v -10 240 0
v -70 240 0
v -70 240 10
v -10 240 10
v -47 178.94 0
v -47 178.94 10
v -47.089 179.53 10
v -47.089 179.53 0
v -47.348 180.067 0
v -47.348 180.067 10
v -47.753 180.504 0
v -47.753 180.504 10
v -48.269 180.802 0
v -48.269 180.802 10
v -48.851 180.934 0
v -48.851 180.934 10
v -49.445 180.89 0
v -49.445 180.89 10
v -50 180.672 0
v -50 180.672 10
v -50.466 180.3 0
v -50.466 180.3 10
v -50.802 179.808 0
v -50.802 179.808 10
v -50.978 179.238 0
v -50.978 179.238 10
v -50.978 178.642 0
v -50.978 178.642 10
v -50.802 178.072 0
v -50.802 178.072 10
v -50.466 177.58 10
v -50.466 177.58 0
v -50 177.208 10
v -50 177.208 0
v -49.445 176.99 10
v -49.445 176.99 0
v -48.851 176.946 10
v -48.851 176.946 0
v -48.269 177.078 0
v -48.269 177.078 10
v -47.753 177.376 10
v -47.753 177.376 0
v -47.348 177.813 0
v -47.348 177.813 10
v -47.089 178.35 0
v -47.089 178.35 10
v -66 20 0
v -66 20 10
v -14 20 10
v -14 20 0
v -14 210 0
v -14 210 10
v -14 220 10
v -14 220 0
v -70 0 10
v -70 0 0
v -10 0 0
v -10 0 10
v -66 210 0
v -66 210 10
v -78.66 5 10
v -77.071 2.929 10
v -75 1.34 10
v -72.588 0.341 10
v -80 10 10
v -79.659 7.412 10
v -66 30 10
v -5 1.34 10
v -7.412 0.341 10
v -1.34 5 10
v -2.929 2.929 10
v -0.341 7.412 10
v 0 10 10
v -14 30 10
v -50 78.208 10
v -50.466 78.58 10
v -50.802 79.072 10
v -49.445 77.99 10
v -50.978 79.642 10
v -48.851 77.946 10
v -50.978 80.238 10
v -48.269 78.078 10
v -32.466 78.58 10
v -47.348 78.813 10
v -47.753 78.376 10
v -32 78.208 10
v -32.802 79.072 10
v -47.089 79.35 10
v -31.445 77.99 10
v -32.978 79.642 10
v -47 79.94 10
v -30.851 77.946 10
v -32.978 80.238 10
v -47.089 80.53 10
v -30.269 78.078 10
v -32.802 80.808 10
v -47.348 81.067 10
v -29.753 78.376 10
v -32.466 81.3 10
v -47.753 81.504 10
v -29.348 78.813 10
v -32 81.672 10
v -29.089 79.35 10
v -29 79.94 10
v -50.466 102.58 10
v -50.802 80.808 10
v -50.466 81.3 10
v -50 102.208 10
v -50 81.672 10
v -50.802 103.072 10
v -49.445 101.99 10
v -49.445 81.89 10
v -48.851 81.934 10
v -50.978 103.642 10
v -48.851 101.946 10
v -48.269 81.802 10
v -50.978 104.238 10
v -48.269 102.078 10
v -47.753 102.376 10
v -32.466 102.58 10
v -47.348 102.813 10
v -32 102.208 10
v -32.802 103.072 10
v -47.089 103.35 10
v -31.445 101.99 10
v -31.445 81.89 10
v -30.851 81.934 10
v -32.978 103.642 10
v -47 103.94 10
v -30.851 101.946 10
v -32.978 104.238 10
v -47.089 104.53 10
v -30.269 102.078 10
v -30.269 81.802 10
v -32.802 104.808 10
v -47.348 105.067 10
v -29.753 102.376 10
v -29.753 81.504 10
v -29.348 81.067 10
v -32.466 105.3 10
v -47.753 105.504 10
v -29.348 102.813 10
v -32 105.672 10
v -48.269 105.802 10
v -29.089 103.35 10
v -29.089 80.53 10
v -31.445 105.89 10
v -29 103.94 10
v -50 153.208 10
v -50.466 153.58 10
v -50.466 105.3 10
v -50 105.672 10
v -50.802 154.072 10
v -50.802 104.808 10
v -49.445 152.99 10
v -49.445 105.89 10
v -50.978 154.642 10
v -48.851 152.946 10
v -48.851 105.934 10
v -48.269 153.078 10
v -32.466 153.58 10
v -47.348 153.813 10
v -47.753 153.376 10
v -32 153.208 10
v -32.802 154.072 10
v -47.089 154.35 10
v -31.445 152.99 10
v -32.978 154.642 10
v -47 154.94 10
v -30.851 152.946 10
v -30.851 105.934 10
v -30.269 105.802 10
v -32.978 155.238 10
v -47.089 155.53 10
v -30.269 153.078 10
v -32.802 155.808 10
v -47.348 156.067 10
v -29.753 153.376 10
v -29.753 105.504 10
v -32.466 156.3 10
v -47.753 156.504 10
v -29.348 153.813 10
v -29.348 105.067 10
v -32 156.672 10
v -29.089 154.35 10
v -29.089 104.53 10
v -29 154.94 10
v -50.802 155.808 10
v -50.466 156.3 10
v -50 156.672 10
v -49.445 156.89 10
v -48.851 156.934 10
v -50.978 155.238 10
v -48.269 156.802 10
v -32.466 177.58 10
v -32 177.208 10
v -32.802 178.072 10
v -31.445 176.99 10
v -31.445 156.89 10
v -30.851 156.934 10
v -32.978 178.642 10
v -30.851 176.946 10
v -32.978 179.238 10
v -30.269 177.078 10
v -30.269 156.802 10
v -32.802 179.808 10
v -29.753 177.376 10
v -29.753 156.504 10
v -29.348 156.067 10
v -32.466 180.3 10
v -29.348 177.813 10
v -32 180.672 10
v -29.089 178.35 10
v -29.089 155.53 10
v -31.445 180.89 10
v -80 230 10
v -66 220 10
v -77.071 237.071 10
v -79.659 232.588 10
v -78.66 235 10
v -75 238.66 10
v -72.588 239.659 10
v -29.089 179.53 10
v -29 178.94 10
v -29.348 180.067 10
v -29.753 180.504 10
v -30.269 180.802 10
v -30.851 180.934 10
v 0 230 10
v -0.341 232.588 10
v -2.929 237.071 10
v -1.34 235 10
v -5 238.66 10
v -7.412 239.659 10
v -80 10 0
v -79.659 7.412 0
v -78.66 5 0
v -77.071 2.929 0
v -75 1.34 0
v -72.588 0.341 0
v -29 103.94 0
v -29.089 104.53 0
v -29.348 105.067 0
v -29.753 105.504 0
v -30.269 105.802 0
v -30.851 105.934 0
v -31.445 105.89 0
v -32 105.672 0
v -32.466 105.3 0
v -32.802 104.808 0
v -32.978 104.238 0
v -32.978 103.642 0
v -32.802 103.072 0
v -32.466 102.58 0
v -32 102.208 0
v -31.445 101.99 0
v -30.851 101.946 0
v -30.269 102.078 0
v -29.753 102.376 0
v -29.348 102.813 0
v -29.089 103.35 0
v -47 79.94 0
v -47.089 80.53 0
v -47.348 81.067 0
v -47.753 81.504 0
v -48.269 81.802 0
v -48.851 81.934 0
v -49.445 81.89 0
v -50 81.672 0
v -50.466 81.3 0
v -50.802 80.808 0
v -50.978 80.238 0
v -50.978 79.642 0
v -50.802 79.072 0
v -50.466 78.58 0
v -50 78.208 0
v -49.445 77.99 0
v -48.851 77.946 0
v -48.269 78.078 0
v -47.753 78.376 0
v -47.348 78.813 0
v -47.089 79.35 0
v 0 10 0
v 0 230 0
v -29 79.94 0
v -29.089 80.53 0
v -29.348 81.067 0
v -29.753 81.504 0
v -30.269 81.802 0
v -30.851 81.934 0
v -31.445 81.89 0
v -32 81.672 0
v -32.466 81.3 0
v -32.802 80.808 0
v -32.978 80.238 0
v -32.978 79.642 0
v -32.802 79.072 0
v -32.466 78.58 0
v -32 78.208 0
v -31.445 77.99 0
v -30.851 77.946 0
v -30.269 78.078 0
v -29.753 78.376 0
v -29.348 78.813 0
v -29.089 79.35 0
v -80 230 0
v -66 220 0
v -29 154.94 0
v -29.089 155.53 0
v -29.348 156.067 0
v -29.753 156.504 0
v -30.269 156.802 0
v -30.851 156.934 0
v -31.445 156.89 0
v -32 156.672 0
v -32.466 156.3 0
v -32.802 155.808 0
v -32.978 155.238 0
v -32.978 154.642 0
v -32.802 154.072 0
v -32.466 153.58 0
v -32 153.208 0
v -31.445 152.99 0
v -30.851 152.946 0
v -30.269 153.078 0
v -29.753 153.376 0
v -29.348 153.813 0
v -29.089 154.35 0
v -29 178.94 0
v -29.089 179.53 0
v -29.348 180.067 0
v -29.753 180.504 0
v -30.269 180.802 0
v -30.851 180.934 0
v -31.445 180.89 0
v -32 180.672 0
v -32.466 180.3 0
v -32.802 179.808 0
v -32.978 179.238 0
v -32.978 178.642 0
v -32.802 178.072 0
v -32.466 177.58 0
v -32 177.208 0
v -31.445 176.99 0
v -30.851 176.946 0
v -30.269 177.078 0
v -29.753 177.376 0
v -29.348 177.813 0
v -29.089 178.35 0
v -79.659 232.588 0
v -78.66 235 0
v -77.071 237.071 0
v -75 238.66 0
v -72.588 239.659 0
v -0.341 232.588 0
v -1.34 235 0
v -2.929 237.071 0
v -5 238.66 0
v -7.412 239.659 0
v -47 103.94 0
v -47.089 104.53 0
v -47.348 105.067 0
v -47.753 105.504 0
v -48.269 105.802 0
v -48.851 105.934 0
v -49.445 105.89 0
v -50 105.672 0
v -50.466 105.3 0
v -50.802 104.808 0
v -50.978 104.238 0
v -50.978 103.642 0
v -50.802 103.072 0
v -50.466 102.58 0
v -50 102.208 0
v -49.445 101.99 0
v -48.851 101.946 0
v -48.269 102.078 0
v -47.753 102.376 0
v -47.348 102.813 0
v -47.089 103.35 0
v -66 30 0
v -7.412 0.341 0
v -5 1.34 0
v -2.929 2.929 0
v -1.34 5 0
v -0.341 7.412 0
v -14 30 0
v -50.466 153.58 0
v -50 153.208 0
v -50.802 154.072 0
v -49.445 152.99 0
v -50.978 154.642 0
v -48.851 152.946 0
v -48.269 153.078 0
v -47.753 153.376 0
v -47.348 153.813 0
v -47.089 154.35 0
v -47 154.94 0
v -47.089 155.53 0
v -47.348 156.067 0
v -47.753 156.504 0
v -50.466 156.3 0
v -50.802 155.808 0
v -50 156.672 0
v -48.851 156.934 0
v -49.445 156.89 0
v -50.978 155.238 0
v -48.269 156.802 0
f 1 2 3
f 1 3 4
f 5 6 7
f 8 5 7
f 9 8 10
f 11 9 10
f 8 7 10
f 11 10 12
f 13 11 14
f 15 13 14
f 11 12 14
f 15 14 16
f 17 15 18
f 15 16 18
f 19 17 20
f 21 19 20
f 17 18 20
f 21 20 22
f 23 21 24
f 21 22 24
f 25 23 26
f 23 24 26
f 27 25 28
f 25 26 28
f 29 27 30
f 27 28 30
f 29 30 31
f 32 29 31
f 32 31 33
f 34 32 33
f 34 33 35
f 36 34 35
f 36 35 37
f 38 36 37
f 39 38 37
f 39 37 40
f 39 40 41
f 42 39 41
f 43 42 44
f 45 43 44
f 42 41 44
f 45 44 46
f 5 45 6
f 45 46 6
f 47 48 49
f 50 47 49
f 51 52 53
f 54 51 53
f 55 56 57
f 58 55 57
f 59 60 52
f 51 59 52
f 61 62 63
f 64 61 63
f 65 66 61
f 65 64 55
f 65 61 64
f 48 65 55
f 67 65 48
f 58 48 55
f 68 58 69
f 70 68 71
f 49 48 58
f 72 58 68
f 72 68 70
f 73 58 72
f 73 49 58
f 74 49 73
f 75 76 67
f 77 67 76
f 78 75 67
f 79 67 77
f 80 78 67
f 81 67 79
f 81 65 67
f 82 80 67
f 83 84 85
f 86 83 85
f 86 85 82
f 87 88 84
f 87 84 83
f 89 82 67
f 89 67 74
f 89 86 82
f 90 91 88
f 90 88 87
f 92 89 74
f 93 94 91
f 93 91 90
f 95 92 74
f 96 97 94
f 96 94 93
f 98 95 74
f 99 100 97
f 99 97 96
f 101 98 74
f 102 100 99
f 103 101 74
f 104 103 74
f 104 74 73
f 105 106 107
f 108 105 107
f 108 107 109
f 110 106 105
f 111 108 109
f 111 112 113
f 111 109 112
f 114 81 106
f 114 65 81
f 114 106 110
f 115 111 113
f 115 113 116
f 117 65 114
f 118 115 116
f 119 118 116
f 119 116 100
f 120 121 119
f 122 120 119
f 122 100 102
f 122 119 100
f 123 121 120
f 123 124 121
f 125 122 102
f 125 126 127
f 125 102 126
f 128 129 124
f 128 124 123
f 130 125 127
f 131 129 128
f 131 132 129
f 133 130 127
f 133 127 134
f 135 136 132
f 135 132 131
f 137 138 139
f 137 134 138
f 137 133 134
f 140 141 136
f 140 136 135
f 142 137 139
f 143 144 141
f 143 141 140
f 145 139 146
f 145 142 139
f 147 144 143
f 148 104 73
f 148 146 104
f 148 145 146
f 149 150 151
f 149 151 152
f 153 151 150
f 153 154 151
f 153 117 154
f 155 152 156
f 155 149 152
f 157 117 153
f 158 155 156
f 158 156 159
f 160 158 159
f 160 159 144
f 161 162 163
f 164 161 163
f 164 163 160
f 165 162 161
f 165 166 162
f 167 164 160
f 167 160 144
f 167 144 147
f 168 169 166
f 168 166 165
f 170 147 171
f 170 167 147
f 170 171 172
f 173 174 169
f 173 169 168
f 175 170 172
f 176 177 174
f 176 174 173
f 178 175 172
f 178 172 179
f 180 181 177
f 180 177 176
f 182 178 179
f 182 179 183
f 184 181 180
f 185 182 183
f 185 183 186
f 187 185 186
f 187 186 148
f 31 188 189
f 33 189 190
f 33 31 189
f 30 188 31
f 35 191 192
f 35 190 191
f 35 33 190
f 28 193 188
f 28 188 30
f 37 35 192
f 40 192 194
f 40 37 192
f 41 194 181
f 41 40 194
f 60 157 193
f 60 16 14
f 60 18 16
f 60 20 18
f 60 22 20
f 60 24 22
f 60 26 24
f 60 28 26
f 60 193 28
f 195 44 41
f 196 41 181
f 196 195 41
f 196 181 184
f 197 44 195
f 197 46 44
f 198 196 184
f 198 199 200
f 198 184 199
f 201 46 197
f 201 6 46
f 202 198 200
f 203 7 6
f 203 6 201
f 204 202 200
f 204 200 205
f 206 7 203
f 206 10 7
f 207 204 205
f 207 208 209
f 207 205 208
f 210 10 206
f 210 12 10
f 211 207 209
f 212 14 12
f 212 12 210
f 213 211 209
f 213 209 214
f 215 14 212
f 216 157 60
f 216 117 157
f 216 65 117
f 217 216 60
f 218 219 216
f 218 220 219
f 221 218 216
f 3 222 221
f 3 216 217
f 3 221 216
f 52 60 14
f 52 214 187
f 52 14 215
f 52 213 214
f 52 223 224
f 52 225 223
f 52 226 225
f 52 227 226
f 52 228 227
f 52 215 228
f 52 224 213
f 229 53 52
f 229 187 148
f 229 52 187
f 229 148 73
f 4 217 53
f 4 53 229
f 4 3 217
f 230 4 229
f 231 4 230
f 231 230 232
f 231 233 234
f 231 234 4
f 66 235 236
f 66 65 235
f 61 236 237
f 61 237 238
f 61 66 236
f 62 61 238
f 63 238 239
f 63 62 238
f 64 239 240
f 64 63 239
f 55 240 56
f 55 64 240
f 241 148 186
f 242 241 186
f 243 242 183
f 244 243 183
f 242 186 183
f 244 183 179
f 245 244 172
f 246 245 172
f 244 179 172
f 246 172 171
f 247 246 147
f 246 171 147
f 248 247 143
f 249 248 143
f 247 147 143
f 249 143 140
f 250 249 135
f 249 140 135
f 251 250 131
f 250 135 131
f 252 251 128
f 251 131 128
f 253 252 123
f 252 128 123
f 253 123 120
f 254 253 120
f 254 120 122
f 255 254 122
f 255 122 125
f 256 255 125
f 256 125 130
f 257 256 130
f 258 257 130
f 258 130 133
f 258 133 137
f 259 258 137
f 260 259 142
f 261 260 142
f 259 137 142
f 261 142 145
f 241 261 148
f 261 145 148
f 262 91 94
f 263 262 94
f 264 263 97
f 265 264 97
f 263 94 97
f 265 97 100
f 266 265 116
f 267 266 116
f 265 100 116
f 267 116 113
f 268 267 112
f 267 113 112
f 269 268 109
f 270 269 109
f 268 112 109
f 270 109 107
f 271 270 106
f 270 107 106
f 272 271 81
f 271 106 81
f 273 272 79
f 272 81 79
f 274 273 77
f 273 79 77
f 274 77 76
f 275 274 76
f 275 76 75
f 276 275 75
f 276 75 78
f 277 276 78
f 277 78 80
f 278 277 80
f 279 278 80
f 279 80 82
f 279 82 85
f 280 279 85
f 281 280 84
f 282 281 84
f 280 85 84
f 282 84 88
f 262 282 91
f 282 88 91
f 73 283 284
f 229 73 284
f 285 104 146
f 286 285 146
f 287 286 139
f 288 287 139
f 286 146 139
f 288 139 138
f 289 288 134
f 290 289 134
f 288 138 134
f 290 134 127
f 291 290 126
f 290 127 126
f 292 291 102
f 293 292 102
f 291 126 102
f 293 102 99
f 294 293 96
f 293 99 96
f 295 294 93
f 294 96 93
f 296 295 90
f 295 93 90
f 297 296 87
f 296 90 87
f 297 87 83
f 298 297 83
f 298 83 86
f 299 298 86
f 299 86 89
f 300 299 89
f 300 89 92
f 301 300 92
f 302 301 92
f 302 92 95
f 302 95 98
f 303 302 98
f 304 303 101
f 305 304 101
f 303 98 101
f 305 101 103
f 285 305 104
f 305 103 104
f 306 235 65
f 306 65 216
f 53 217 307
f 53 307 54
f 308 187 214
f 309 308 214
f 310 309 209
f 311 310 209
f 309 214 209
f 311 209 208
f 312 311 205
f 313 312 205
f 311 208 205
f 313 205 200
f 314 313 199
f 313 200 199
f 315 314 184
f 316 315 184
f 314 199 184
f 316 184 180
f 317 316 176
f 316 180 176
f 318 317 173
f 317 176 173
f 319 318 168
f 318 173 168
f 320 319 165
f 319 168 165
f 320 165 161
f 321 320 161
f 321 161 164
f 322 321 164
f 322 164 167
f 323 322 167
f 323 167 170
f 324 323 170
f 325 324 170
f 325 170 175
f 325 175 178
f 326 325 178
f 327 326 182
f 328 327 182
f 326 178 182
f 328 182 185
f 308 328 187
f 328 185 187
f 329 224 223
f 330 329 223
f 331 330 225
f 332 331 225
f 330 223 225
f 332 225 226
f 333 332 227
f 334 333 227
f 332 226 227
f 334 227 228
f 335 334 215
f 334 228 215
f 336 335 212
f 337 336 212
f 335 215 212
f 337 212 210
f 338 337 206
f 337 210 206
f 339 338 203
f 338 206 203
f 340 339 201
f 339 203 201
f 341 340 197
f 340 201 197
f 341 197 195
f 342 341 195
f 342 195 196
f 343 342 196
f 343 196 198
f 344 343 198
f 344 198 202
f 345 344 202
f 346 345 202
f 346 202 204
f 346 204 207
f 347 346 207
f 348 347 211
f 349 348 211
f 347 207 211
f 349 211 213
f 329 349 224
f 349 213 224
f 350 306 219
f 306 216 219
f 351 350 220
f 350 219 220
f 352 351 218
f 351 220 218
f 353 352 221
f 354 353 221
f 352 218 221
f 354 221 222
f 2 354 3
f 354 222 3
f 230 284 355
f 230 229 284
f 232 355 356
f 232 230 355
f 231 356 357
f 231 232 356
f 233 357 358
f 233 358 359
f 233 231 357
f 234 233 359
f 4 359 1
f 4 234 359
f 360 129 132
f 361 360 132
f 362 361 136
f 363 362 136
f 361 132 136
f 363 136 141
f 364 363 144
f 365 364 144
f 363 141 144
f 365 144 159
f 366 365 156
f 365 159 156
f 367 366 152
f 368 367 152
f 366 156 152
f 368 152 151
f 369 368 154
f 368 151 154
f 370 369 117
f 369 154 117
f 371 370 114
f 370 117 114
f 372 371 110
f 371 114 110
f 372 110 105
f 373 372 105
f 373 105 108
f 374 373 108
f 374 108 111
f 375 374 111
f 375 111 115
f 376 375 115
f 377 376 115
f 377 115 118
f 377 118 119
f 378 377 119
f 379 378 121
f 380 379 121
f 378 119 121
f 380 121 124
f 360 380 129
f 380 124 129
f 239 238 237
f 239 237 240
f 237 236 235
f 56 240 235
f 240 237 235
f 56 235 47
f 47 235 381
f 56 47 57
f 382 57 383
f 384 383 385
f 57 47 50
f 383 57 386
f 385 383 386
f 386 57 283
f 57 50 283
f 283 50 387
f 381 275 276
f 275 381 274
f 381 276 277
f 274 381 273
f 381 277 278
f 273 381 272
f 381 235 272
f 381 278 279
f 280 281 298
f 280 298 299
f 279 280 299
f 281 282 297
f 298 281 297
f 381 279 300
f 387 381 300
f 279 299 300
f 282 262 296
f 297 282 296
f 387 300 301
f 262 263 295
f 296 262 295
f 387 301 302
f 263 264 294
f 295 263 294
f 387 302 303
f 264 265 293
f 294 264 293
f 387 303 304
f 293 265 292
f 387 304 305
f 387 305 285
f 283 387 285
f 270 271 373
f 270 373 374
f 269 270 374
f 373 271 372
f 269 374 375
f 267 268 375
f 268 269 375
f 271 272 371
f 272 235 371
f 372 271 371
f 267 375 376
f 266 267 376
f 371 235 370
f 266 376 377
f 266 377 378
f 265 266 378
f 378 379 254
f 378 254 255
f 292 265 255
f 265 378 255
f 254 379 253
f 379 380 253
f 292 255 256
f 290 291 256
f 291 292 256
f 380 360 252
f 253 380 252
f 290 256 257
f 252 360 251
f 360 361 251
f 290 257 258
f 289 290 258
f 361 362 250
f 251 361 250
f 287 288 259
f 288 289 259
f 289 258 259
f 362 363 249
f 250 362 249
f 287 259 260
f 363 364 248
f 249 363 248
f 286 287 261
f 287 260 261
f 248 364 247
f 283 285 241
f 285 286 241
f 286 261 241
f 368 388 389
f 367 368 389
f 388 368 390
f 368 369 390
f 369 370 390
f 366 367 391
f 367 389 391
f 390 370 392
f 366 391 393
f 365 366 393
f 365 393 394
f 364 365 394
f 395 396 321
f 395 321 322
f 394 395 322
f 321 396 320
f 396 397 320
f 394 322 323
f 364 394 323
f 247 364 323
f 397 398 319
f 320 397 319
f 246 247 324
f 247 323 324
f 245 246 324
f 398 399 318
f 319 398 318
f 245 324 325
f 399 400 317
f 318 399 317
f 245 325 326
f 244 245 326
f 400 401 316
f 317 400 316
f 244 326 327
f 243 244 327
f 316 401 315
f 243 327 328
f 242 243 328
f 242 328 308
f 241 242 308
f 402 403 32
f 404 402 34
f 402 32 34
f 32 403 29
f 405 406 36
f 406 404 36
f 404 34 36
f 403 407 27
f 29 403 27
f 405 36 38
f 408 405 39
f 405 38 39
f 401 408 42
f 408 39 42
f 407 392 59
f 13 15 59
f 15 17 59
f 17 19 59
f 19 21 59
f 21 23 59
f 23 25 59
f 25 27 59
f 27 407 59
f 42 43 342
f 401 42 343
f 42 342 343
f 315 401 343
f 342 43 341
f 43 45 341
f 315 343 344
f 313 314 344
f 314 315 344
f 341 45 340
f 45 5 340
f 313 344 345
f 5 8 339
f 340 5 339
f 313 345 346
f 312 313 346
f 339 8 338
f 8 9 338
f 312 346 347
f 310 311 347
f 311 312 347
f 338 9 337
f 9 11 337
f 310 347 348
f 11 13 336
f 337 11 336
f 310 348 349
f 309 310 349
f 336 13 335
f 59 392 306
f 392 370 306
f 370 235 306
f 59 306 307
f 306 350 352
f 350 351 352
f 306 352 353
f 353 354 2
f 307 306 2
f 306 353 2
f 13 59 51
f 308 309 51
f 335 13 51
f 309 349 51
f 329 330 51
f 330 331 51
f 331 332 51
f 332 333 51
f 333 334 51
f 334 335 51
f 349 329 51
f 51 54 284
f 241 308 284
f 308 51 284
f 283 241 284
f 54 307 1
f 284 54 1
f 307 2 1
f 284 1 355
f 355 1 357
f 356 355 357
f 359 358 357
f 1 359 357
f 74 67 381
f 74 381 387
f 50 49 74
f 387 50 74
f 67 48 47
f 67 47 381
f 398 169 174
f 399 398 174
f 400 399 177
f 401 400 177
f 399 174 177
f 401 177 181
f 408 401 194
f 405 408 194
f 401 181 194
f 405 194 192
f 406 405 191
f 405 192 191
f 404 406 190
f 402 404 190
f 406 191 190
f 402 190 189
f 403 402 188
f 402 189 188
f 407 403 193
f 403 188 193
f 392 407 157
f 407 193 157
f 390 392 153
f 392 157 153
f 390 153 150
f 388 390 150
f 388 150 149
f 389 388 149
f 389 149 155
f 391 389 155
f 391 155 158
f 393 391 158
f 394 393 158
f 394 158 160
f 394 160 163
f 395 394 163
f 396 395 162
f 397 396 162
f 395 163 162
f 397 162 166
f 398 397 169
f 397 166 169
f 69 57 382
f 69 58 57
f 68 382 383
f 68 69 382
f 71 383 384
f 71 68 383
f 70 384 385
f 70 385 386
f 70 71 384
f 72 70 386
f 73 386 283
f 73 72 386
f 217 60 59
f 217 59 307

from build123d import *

# Parameters (mm, degrees)
SKETCH1_W           = 80
SKETCH1_H           = 240
BOSS_EXTRUDE1_DEPTH = 10
FILLET2_R           = 10
SKETCH2_R           = 2
SKETCH2_W           = 52
SKETCH2_H           = 10
CUT_EXTRUDE1_DEPTH  = 10


with BuildPart() as part:
    # Sketch1 → Boss-Extrude1 (new body)
    with BuildSketch(Plane.XY):
        with Locations((-40, 120)):
            Rectangle(SKETCH1_W, SKETCH1_H)
    extrude(amount=BOSS_EXTRUDE1_DEPTH)

    # Fillet2
    fillet2_edges = [part.edges().sort_by_distance(p)[0] for p in [
        (0, 0, 5),
        (-80, 0, 5),
        (-80, 240, 5),
        (0, 240, 5),
    ]]
    fillet(fillet2_edges, radius=FILLET2_R)

    # Sketch2 → Cut-Extrude1 (cut)
    with BuildSketch(Plane.XY.offset(10)):
        with Locations((-49, 154.94)):
            Circle(SKETCH2_R)
        with Locations((-31, 154.94)):
            Circle(SKETCH2_R)
        with Locations((-31, 178.94)):
            Circle(SKETCH2_R)
        with Locations((-49, 178.94)):
            Circle(SKETCH2_R)
        with Locations((-49, 103.94)):
            Circle(SKETCH2_R)
        with Locations((-49, 79.94)):
            Circle(SKETCH2_R)
        with Locations((-31, 103.94)):
            Circle(SKETCH2_R)
        with Locations((-31, 79.94)):
            Circle(SKETCH2_R)
        with Locations((-40, 215)):
            Rectangle(SKETCH2_W, SKETCH2_H)
        with Locations((-40, 25)):
            Rectangle(SKETCH2_W, SKETCH2_H)
    extrude(amount=-CUT_EXTRUDE1_DEPTH, mode=Mode.SUBTRACT)


solid = part.part
